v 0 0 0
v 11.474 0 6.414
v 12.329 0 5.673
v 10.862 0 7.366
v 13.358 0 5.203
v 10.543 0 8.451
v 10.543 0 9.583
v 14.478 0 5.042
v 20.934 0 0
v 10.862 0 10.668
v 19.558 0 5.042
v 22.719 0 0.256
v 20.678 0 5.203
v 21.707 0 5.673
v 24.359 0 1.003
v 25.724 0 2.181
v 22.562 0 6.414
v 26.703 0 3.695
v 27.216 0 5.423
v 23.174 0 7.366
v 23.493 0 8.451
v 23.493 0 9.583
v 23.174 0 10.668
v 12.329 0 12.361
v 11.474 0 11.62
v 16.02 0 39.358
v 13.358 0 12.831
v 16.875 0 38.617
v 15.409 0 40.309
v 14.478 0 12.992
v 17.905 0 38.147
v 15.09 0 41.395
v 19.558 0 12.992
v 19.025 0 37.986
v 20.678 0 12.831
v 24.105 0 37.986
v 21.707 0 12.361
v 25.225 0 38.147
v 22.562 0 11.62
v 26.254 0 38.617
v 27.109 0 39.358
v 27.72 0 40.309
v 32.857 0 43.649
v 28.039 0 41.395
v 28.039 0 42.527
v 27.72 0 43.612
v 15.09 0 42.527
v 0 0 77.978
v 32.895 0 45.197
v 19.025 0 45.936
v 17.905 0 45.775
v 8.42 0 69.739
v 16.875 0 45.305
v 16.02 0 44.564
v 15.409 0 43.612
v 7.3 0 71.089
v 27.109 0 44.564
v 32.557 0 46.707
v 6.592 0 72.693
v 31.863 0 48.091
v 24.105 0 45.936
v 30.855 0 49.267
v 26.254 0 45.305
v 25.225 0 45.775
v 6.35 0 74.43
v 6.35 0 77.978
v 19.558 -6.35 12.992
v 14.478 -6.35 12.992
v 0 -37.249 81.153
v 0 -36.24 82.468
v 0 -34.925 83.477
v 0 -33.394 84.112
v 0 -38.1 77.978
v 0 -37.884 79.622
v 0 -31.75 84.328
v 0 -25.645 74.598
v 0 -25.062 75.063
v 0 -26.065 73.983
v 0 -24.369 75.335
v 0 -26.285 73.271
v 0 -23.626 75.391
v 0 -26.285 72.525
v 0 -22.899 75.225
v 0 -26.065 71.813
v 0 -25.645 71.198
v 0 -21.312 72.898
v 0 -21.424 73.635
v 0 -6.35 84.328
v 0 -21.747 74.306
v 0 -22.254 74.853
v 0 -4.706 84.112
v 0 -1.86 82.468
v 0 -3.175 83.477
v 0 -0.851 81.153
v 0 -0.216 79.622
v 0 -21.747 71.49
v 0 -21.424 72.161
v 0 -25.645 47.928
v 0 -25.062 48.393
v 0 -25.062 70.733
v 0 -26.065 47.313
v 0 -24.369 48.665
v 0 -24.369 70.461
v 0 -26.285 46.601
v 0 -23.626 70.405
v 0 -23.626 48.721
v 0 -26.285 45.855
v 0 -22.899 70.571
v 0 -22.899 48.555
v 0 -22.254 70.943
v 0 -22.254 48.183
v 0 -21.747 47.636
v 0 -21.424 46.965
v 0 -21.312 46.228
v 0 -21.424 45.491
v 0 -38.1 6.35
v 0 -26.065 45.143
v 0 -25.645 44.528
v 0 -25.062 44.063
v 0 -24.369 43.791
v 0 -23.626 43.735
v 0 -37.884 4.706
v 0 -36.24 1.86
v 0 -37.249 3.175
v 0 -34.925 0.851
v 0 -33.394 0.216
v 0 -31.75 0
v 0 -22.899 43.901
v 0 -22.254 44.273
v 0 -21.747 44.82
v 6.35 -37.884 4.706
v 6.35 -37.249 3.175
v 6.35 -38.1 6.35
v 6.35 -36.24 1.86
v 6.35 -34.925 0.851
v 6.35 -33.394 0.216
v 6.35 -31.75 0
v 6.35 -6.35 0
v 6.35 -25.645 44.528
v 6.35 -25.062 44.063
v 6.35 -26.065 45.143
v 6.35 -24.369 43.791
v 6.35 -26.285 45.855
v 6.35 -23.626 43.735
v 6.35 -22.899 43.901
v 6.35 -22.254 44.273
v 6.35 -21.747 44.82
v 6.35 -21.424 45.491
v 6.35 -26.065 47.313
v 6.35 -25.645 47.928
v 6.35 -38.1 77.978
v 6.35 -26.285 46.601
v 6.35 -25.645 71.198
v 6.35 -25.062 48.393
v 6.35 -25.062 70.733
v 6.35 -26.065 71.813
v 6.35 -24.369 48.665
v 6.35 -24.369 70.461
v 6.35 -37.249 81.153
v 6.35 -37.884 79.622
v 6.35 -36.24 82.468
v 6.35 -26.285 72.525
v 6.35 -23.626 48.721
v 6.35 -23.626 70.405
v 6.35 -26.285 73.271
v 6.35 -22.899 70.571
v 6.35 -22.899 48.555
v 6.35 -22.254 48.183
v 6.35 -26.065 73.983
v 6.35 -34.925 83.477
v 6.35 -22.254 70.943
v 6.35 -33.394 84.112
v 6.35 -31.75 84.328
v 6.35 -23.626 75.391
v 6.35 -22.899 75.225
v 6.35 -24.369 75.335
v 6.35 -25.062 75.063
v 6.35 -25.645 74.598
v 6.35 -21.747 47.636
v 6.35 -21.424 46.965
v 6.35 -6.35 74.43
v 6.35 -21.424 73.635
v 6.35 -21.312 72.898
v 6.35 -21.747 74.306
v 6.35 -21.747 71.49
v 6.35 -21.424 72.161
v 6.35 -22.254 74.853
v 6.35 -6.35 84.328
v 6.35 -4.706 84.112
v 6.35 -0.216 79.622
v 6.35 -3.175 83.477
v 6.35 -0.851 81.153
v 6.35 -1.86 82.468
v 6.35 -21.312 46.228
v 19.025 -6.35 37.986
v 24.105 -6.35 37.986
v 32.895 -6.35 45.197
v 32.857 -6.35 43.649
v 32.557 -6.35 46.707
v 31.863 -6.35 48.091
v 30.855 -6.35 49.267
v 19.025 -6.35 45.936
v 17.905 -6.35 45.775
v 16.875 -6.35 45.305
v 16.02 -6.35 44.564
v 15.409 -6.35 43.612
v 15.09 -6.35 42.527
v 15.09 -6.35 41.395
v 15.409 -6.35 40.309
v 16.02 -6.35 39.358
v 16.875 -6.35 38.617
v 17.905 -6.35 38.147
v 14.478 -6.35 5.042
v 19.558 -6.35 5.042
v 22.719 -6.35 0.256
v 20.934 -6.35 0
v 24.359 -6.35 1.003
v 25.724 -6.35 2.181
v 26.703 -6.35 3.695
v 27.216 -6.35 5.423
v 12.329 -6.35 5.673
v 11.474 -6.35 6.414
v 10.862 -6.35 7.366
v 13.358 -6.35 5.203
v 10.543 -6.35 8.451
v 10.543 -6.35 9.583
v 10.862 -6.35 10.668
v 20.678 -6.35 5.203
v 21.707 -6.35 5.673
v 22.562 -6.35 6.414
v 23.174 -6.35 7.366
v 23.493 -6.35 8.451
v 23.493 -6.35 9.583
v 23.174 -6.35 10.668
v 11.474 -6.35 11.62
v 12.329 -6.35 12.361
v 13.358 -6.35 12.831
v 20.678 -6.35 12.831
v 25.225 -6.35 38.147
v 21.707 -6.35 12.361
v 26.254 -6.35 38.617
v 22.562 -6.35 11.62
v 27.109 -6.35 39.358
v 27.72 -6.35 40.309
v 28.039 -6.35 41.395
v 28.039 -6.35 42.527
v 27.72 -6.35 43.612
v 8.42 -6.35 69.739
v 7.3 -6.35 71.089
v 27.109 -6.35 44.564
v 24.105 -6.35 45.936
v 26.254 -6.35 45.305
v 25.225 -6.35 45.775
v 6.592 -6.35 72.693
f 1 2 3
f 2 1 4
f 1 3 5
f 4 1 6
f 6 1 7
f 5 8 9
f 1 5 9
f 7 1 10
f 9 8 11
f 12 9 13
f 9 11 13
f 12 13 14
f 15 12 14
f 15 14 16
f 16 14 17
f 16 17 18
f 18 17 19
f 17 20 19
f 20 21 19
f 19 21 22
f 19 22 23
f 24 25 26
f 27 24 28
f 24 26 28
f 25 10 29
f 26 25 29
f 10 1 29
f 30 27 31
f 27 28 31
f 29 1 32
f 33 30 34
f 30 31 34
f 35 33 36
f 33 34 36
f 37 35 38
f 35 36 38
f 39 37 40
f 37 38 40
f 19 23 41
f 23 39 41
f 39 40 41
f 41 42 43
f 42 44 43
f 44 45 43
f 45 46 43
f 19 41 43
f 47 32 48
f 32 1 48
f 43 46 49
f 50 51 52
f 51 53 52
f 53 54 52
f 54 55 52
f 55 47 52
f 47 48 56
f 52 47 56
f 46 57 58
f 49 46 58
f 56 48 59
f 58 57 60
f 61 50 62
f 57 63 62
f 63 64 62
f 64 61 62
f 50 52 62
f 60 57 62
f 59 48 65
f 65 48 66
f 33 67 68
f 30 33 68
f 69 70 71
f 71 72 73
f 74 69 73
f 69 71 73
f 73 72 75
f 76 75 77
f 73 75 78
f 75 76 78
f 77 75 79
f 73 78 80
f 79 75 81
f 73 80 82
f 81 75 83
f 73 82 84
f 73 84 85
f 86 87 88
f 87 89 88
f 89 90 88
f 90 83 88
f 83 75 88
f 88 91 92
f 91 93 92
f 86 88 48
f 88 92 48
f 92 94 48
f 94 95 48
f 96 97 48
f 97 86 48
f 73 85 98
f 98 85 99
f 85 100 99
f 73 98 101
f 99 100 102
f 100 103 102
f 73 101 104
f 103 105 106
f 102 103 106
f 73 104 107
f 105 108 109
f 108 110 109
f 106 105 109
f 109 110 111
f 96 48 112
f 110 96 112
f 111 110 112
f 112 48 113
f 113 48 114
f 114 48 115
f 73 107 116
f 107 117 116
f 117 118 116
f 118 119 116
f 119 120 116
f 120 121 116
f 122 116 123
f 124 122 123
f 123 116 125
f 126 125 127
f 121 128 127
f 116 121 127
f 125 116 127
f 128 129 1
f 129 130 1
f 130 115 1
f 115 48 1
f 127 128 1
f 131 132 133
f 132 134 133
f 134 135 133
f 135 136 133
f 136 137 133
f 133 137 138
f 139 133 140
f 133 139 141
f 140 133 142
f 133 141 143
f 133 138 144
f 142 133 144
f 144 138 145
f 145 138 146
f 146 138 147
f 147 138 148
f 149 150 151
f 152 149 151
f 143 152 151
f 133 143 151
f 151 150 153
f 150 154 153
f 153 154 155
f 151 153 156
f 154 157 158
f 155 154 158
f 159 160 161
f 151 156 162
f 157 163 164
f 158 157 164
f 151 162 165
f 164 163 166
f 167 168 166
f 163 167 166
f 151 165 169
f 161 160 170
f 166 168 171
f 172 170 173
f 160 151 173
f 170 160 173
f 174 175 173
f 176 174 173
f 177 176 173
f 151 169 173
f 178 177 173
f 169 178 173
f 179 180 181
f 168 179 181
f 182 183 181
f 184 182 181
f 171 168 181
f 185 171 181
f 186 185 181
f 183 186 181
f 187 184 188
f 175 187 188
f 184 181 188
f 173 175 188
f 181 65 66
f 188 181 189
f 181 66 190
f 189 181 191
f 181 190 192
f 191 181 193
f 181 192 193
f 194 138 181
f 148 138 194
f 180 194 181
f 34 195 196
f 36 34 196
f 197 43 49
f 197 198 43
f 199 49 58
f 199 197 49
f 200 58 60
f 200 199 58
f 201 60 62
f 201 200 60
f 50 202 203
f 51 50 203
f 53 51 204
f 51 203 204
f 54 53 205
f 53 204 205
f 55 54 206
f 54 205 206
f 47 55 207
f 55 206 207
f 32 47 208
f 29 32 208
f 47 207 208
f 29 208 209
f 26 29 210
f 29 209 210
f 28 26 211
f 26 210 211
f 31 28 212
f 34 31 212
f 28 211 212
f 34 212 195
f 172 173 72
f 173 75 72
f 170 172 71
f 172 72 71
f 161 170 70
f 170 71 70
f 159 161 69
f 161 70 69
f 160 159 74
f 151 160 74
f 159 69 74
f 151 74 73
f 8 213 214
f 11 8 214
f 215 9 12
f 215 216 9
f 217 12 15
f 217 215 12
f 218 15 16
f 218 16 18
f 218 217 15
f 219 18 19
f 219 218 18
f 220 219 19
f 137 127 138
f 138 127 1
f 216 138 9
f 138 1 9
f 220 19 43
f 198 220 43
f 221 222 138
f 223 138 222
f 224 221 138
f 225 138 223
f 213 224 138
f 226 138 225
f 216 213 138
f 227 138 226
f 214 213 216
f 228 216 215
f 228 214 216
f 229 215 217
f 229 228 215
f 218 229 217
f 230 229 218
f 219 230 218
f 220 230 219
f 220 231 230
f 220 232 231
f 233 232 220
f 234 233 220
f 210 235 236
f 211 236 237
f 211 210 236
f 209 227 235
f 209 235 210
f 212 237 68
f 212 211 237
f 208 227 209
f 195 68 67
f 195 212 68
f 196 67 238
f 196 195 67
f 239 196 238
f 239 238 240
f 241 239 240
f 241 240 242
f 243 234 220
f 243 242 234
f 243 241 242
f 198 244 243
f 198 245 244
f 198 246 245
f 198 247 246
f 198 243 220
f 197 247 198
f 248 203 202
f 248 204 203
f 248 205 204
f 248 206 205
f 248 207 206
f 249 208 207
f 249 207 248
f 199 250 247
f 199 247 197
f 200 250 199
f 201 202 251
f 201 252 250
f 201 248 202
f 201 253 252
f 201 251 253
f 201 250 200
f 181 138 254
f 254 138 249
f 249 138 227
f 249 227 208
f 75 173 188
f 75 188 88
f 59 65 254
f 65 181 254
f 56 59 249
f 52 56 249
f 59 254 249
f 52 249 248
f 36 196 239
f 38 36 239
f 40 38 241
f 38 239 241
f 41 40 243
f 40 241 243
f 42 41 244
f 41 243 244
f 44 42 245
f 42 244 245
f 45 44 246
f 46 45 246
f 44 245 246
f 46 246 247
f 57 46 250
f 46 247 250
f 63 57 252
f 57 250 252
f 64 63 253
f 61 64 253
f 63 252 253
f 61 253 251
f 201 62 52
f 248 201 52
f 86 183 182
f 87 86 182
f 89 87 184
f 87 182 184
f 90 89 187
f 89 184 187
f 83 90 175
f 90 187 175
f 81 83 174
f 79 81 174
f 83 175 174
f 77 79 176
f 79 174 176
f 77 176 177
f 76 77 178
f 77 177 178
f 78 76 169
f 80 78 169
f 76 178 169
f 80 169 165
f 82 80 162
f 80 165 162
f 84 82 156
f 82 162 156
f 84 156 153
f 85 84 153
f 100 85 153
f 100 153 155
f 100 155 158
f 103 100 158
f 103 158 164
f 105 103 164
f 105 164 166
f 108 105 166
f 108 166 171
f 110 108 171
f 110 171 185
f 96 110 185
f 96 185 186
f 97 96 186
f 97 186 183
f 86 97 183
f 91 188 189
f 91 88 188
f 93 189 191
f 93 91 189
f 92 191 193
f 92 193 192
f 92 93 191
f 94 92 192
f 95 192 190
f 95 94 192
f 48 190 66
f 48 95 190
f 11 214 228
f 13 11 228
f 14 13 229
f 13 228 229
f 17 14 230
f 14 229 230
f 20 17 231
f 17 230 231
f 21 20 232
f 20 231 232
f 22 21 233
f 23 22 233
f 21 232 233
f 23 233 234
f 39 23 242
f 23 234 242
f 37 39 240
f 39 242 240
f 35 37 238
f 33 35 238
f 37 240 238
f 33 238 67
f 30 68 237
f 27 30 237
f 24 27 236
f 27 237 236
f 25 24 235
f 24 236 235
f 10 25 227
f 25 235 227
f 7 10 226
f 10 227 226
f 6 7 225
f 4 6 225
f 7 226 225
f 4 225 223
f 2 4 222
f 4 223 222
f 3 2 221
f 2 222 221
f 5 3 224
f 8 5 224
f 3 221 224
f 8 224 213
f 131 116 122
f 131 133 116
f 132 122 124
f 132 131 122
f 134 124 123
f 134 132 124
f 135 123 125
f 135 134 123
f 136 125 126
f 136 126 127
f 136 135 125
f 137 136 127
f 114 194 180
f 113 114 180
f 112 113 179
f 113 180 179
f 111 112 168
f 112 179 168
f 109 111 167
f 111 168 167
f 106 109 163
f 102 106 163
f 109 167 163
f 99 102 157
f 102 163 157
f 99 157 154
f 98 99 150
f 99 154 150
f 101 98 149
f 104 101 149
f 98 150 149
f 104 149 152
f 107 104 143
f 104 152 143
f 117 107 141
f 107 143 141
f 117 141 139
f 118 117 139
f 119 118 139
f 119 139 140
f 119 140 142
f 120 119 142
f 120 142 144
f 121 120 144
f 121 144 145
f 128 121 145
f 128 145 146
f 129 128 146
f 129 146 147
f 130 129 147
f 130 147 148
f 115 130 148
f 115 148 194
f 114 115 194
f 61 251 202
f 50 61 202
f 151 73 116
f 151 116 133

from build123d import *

# Parameters (mm, degrees)
F1_DEPTH = 6.35
F3_DEPTH = 31.75
F5_DEPTH = 25.4
F6_R     = 2.5
F7_DEPTH = 25.4
F8_R     = 6.35


with BuildPart() as f1:
    # F0 (on Front) → F1 (new body)
    with BuildSketch(Plane.XZ):
        Polygon((0, 84.328), (0, 0), (26.416, 0), (33.3502, 46.99), (6.35, 71.628), (6.35, 84.328), align=None)
    extrude(amount=F1_DEPTH)

    # F2 (on face) → F3 (join)
    with BuildSketch(Plane.XZ.offset(6.35)):
        Polygon((0, 84.328), (0, 0), (6.35, 0), (6.35, 71.628), (6.35, 84.328), align=None)
    extrude(amount=F3_DEPTH)

    # F4 (on face) → F5 (cut)
    with BuildSketch(Plane.XZ.offset(6.35)):
        with BuildLine():
            Line((19.558, 12.9921), (14.478, 12.9921))
            ThreePointArc((14.478, 12.9921), (10.5029, 9.017), (14.478, 5.0419))
            Line((14.478, 5.0419), (19.558, 5.0419))
            ThreePointArc((19.558, 5.0419), (23.5331, 9.017), (19.558, 12.9921))
        make_face()
        with BuildLine():
            Line((24.1046, 45.9359), (19.0246, 45.9359))
            ThreePointArc((19.0246, 45.9359), (15.0495, 41.9608), (19.0246, 37.9857))
            Line((19.0246, 37.9857), (24.1046, 37.9857))
            ThreePointArc((24.1046, 37.9857), (28.0797, 41.9608), (24.1046, 45.9359))
        make_face()
    extrude(amount=-F5_DEPTH, mode=Mode.SUBTRACT)

    # F6 (on face) → F7 (cut)
    with BuildSketch(Plane.YZ.offset(6.35)):
        with Locations((-23.8125, 46.228)):
            Circle(F6_R)
        with Locations((-23.8125, 72.898)):
            Circle(F6_R)
    extrude(amount=-F7_DEPTH, mode=Mode.SUBTRACT)

    # F8
    f8_edges = [f1.edges().sort_by_distance(p)[0] for p in [
        (26.416, -3.175, 0),
        (33.3502, -3.175, 46.99),
        (6.35, -3.175, 71.628),
        (3.175, 0, 84.328),
        (3.175, -38.1, 84.328),
        (3.175, -38.1, 0),
    ]]
    fillet(f8_edges, radius=F8_R)


solid = f1.part
